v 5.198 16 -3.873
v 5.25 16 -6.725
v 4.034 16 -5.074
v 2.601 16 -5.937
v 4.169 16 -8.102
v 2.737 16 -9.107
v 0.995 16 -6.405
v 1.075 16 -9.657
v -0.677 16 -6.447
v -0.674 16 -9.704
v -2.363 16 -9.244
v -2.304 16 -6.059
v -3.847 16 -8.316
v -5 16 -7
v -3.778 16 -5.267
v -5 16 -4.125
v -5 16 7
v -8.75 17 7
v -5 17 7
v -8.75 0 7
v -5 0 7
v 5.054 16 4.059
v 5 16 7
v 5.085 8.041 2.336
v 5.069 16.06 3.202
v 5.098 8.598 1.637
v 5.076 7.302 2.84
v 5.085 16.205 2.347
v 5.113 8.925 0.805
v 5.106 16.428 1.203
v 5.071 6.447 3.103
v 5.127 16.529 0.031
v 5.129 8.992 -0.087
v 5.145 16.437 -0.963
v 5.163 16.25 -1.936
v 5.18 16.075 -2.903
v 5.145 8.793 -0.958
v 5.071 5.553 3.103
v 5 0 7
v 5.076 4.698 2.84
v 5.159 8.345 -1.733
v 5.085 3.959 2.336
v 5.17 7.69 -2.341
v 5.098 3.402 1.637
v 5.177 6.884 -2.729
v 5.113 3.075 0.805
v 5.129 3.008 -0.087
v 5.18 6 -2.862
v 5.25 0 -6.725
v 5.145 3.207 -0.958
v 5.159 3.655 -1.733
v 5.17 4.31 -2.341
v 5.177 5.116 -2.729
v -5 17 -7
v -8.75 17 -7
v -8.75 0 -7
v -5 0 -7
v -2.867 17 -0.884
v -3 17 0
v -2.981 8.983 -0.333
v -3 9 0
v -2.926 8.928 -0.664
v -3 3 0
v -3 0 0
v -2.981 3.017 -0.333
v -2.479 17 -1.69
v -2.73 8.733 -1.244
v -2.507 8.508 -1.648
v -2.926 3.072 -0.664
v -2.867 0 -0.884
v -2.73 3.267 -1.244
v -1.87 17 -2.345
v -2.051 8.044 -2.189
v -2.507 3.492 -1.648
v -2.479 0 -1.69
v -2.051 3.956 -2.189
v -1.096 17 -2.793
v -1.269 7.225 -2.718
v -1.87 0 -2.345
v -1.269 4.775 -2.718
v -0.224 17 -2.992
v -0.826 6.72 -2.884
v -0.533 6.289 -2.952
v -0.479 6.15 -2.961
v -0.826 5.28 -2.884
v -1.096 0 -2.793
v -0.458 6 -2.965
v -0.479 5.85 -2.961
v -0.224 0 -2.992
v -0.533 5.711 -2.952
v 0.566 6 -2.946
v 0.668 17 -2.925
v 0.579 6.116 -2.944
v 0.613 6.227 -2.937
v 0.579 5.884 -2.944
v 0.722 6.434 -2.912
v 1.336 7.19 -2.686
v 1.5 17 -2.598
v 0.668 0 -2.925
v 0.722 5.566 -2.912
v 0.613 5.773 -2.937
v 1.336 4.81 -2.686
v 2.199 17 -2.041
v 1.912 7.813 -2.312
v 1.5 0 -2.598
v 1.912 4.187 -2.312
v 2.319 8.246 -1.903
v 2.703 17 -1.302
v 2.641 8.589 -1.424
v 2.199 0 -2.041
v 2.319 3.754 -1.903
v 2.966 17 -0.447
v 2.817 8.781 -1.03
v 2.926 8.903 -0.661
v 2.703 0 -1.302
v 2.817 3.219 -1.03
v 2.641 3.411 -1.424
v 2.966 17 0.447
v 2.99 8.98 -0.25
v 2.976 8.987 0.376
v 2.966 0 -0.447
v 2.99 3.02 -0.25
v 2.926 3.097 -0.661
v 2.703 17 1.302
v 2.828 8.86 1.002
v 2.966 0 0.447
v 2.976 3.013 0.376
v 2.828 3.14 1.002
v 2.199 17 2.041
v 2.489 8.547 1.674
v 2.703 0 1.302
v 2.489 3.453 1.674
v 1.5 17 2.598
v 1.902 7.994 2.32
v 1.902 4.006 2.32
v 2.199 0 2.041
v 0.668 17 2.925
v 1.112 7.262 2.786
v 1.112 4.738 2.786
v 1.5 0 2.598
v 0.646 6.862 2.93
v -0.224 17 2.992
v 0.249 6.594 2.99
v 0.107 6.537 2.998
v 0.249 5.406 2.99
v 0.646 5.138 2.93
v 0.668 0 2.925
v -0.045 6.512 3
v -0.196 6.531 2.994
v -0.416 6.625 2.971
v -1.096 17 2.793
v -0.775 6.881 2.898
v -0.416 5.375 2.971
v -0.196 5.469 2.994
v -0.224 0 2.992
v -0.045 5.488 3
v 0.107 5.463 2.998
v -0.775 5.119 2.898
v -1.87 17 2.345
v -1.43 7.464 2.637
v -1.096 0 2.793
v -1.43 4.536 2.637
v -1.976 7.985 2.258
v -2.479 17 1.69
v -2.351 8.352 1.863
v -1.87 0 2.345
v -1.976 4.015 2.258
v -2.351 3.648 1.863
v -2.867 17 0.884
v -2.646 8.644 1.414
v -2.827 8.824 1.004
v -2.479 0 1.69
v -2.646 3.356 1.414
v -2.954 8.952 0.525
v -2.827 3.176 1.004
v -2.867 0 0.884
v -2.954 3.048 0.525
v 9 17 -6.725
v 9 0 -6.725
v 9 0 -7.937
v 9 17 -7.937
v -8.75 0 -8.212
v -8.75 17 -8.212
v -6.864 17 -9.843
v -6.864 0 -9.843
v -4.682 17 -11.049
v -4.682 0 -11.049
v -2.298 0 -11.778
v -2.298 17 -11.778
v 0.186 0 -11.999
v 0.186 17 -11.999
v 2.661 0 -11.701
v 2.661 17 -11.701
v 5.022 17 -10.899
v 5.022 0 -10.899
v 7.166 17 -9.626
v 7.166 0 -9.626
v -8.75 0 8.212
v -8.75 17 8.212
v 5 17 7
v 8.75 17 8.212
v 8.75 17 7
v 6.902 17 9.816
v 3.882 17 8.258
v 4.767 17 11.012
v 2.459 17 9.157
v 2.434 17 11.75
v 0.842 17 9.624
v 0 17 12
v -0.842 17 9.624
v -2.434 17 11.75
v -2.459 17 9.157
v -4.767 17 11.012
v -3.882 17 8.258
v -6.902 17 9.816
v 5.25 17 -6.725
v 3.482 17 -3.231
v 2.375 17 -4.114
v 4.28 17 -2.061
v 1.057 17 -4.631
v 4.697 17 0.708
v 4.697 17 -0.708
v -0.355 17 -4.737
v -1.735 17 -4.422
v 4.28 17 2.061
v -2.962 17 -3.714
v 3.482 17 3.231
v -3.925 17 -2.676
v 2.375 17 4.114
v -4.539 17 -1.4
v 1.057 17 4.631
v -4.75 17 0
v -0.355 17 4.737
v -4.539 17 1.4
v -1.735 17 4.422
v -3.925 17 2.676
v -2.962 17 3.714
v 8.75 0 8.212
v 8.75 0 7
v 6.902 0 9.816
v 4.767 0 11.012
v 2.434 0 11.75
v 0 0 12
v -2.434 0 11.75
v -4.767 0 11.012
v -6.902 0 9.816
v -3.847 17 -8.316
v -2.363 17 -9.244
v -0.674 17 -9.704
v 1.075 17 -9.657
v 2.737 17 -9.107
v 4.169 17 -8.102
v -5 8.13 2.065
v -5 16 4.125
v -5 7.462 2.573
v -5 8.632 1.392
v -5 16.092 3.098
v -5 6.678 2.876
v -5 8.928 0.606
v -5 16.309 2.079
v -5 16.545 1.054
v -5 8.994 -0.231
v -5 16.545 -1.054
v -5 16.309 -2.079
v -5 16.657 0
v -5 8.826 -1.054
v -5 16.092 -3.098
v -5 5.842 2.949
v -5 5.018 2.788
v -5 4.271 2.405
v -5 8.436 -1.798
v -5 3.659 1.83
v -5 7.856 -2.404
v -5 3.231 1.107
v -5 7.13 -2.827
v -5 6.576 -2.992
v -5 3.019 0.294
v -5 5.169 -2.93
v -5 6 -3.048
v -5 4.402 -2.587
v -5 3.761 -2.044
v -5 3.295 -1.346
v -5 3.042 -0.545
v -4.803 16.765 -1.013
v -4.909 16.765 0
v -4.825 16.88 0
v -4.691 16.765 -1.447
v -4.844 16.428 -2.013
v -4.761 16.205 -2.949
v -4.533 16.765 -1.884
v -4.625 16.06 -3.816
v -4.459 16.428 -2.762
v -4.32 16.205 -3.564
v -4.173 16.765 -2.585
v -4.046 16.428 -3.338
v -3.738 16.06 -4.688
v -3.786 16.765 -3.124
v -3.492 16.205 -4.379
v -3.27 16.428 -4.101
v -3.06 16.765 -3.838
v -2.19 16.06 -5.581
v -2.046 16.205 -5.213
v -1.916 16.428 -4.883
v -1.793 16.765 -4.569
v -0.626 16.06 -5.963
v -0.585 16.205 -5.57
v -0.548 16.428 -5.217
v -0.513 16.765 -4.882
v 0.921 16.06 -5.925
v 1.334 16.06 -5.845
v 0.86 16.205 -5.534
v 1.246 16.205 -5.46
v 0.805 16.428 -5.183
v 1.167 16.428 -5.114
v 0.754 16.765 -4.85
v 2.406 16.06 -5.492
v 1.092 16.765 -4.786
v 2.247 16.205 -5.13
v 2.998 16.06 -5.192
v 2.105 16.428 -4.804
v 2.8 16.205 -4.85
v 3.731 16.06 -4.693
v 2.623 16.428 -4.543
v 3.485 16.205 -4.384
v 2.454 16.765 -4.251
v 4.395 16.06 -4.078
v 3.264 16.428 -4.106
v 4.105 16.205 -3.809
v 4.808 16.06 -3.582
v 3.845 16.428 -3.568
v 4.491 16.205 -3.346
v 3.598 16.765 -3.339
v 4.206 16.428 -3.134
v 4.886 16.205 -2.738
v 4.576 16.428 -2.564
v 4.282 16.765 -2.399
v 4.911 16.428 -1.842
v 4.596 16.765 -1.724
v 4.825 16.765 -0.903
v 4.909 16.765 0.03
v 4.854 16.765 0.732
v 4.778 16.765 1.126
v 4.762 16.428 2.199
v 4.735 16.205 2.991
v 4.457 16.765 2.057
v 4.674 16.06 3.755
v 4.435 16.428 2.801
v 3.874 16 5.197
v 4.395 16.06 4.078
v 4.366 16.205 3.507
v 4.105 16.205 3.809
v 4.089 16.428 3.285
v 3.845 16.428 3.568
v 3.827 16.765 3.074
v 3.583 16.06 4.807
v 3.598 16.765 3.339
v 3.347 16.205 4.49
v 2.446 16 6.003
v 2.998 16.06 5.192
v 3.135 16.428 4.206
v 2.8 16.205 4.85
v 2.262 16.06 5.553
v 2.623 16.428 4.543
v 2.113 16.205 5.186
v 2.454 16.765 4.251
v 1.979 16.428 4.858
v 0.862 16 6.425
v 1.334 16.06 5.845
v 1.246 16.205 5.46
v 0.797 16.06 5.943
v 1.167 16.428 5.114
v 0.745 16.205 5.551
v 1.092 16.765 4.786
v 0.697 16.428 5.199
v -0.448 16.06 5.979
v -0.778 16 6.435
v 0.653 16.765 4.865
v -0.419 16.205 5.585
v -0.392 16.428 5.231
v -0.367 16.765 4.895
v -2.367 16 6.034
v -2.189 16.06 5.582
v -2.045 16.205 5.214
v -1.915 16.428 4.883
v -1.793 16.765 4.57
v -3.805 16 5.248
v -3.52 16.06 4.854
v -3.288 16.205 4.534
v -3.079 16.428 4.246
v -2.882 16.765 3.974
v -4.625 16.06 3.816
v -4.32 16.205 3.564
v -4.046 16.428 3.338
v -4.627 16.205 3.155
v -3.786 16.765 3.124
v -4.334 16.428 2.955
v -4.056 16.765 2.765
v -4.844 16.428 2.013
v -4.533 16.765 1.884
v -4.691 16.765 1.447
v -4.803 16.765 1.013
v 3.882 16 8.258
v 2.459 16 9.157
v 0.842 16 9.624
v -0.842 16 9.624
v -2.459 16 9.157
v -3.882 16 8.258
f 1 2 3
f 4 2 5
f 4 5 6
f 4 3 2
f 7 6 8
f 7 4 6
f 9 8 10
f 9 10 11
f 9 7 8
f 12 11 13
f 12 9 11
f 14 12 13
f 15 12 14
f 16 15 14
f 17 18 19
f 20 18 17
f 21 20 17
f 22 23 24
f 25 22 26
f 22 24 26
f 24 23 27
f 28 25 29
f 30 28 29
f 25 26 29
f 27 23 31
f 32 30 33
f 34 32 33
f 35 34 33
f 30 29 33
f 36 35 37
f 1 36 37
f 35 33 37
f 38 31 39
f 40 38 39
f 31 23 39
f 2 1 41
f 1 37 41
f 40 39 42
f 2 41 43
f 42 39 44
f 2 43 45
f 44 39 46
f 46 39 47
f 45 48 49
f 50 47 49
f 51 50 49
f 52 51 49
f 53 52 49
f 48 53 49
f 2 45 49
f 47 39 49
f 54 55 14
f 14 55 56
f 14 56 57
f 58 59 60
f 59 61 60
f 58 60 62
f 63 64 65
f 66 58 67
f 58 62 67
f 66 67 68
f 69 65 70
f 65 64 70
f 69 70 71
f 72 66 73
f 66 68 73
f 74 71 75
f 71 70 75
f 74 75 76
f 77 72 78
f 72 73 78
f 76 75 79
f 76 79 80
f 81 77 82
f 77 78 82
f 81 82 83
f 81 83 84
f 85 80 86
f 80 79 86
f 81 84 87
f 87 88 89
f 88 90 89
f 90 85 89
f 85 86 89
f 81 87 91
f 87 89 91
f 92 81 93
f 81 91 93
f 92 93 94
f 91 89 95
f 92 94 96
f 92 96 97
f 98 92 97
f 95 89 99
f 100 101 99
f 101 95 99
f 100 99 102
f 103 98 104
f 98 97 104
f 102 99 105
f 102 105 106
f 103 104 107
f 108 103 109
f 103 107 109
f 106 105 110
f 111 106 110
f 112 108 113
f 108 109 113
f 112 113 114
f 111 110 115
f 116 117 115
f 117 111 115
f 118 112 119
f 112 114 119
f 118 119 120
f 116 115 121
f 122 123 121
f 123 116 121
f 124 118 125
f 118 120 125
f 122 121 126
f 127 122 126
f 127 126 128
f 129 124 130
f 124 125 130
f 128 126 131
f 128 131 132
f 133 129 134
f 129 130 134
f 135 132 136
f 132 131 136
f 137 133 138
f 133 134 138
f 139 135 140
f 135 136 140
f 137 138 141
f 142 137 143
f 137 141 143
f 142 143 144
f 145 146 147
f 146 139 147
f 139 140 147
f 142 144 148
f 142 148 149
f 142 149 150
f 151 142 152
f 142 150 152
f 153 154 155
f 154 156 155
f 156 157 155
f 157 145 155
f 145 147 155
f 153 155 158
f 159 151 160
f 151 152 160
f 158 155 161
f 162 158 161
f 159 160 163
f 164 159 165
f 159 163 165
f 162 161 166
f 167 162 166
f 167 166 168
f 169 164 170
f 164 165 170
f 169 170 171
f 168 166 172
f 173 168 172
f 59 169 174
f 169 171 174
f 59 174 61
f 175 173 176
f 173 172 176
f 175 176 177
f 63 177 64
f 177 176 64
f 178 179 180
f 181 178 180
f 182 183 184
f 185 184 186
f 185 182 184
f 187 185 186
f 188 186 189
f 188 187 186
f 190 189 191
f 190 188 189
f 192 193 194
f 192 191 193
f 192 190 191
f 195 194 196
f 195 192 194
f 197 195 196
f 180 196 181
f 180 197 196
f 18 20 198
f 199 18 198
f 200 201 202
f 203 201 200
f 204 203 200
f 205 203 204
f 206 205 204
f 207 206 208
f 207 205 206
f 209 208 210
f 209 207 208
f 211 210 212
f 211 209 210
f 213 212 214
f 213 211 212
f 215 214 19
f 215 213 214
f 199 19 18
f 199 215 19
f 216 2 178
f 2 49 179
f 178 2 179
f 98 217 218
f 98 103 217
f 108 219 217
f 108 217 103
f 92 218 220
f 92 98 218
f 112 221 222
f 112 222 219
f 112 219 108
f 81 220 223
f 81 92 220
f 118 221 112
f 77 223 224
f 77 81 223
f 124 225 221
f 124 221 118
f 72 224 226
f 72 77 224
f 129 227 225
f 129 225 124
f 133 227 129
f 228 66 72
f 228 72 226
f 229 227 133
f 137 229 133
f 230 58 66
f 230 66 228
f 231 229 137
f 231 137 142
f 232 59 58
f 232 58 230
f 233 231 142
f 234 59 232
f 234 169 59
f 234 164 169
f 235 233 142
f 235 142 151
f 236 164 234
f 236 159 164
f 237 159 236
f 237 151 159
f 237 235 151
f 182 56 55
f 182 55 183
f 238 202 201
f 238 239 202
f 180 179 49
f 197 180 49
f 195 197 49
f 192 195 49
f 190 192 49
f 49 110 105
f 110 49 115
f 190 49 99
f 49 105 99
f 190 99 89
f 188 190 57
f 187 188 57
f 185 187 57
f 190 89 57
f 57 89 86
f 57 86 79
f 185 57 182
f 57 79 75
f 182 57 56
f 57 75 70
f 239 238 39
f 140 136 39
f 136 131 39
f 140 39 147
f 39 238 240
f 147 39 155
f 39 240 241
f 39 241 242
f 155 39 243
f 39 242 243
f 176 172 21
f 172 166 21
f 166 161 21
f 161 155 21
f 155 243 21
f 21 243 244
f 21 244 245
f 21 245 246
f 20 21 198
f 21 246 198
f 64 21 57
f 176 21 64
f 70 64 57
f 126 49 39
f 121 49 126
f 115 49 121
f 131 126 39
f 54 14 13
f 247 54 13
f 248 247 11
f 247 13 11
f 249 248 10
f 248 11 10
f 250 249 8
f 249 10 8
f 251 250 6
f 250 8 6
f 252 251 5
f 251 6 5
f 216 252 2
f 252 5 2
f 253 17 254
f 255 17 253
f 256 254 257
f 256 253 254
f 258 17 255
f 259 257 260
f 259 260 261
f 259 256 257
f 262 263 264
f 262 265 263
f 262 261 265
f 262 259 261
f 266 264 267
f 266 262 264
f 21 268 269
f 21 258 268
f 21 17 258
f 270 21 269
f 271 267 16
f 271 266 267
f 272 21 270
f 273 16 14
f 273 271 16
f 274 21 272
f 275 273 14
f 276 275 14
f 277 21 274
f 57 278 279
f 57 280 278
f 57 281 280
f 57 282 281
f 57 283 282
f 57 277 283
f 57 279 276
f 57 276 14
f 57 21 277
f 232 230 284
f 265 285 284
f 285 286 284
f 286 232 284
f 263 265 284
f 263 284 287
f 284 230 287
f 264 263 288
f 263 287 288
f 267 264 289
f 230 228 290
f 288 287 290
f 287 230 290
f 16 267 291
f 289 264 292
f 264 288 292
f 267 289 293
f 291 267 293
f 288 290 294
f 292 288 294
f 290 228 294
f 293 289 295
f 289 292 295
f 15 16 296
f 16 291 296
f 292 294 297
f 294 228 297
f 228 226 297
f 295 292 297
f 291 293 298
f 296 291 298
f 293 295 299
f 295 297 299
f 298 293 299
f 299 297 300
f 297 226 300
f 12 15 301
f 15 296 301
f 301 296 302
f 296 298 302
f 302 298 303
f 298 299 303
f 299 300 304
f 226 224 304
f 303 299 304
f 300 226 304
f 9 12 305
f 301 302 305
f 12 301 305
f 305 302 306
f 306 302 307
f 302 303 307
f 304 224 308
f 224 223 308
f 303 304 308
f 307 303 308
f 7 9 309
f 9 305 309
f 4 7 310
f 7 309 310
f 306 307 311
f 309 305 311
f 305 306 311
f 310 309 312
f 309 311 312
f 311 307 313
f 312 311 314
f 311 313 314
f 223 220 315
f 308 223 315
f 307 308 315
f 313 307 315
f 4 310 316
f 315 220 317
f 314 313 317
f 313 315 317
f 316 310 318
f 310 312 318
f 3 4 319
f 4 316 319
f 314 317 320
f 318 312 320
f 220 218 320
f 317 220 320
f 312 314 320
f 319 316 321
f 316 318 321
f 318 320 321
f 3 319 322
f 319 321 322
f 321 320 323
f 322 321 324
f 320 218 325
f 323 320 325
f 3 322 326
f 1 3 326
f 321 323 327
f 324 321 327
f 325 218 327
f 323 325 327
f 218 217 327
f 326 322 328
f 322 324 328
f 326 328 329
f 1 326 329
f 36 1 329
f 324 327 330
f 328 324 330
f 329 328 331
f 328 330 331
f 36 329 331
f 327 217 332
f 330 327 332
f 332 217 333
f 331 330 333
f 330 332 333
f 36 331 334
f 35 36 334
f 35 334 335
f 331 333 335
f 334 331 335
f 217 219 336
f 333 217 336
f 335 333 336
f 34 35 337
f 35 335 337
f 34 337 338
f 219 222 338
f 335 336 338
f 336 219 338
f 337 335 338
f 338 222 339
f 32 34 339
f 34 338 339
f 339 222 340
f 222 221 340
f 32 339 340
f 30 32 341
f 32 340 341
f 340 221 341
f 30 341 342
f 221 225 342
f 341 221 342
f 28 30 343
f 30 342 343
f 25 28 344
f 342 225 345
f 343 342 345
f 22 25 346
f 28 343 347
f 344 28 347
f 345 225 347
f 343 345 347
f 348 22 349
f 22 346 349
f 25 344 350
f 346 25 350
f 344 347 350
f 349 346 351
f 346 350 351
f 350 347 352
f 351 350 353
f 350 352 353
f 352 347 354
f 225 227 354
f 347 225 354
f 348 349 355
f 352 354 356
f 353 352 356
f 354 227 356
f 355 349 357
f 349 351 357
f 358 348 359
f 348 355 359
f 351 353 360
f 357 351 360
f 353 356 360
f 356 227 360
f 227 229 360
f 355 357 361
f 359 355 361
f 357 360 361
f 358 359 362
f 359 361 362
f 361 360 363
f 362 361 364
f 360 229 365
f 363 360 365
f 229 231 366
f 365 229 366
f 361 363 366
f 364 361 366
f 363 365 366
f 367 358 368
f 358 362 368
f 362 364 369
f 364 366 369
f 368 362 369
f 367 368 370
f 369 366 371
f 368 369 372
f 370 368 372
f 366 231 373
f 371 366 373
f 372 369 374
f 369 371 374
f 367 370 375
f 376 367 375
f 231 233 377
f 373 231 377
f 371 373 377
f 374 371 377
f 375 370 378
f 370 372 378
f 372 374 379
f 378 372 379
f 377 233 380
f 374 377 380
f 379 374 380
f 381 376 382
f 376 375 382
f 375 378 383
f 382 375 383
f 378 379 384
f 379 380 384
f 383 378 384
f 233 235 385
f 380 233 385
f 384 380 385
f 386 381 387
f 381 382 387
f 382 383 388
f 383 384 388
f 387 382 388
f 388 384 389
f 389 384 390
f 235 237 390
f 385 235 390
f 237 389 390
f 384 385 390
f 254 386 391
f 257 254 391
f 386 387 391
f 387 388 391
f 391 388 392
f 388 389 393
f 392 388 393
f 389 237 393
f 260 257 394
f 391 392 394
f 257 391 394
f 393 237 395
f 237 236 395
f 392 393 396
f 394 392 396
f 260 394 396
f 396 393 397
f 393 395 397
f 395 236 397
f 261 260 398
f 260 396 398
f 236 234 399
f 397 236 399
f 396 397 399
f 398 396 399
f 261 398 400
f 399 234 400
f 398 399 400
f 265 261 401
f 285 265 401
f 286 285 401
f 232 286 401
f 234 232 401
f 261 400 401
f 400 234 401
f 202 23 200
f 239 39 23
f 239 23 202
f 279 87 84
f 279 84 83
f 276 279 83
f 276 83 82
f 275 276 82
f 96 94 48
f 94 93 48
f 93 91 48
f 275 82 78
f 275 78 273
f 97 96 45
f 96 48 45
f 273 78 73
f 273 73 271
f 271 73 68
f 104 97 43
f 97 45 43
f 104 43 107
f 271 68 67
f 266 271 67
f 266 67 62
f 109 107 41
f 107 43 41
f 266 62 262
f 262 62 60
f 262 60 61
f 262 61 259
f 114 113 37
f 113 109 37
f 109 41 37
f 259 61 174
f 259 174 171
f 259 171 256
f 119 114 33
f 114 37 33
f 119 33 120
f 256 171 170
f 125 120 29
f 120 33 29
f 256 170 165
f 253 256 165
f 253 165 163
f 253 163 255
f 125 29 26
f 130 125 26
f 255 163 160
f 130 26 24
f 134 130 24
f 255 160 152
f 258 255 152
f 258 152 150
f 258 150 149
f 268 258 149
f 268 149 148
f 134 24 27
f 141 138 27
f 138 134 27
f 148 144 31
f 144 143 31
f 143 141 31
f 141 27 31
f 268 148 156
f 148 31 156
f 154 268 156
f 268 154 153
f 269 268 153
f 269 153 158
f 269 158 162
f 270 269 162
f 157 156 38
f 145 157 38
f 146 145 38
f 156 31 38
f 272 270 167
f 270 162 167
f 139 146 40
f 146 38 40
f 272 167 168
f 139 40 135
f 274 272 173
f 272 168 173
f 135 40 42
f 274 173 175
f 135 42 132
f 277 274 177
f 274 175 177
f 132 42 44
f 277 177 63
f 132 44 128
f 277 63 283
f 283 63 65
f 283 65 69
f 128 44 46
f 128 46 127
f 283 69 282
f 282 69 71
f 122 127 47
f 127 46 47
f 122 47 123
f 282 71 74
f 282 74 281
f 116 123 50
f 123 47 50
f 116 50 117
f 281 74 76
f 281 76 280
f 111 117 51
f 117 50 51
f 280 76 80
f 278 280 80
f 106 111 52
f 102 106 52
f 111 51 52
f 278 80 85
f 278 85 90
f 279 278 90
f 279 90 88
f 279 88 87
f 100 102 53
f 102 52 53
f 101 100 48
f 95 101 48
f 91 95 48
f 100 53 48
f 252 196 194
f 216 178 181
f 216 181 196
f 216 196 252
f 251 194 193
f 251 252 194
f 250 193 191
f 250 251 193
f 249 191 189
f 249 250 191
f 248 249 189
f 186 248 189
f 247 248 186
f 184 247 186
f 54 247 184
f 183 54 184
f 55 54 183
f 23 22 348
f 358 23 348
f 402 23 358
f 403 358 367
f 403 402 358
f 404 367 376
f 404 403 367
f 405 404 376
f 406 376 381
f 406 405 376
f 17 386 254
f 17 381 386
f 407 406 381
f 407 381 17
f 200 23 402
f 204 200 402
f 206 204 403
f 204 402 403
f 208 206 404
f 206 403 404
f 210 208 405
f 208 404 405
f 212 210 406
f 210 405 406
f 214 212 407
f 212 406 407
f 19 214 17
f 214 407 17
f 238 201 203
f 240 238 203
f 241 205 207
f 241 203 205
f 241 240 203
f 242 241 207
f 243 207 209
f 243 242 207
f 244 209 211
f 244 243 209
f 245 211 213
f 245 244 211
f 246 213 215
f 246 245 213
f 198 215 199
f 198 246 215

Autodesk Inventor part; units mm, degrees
ref_plane "YZ Plane" through (0, 0, 0) normal (1, 0, 0) x (0, 1, 0)
ref_plane "XZ Plane" through (0, 0, 0) normal (0, 1, 0) x (-1, 0, 0)
ref_plane "XY Plane" through (0, 0, 0) normal (0, 0, 1) x (1, 0, 0)
sketch "Sketch1" plane through (0, 0, 0) normal (0, 1, 0) x (-1, 0, 0)
  circle A0 centre (0, 0) radius 12 construction
  line L0 (8.75, -7) -> (5, -7)
  line L1 (8.75, 7) -> (5, 7)
  line L2 (-5, 7) -> (-8.75, 7)
  line L3 (-5.25, -6.7253) -> (-9, -6.7253)
  line L4 (8.75, -7) -> (8.75, -8.212)
  line L5 (8.75, 7) -> (8.75, 8.212)
  line L6 (-8.75, 7) -> (-8.75, 8.212)
  arc A1 (8.75, 8.212) -> (-8.75, 8.212) centre (0, 0) ccw
  arc A2 (5, 7) -> (-5, 7) centre (0, 3.6834) ccw
  line L7 (-9, -6.7253) -> (-9, -7.9373)
  arc A3 (-9, -7.9373) -> (8.75, -8.212) centre (0, 0) ccw
  arc A4 (-5.25, -6.7253) -> (5, -7) centre (-0.0415, -3.7468) ccw
  circle A5 centre (0, 0) radius 4.75
  circle A6 centre (0, 0) radius 3
  line L8 (5, 7) -> (5, -7)
  line L9 (-5, 7) -> (-5.25, -6.7253)
  dimension "d0" = 24
  dimension "d2" = 3.75
  dimension "d3" = 3.75
  dimension "d5" = 3.75
  dimension "d6" = 3.75
  dimension "d28" = 8.75
  dimension "d29" = 14
  dimension "d31" = 1.212
  dimension "d32" = 1.212
  dimension "d33" = 6
  dimension "d34" = 1.212
  dimension "d35" = 1.212
  dimension "d49" = 9.5
  dimension "d50" = 6
  dimension "d51" = 1.044
extrude "Extrusion3" add sketch "Sketch1" along normal blind 16 contours A4 L9 A2 L8
extrude "Extrusion5" add sketch "Sketch1" along normal blind 17 contours L4 A3 L7 L3 A4 L0 | A2 L2 L6 A1 L5 L1 | A5
sketch "Sketch2" plane through (5.25, 0, -6.7253) normal (0.9998342, 0, 0.0182116) x (0.0182116, 0, -0.9998342)
  line L0 (-13.7275, 0) -> (0, 0) projected
  line L1 (0, 0) -> (0, 16) projected
  line L2 (-13.7275, 16) -> (0, 16) projected
  line L3 (-13.7275, 0) -> (-13.7275, 16) projected
  circle A0 centre (-6.8638, 6) radius 3
  line L4 (2.9272, 16) -> (0, 16) projected
  line L5 (0.0881, 0) -> (-13.9096, 0) projected
  line L6 (-13.9096, 0) -> (-13.9096, 16) projected
  line L7 (0.0881, 16) -> (-13.9096, 16) projected
  line L8 (0.0881, 0) -> (0.0881, 16) projected
  point P0 (-6.8197, 0)
  dimension "d54" = 6
  dimension "d55" = 6
extrude "Extrusion6" cut sketch "Sketch2" against normal through all contours A0
fillet "Fillet1" radius 2 1 edges at (4.75, 16, 0)
properties part number "reverse gear cross head 1"
